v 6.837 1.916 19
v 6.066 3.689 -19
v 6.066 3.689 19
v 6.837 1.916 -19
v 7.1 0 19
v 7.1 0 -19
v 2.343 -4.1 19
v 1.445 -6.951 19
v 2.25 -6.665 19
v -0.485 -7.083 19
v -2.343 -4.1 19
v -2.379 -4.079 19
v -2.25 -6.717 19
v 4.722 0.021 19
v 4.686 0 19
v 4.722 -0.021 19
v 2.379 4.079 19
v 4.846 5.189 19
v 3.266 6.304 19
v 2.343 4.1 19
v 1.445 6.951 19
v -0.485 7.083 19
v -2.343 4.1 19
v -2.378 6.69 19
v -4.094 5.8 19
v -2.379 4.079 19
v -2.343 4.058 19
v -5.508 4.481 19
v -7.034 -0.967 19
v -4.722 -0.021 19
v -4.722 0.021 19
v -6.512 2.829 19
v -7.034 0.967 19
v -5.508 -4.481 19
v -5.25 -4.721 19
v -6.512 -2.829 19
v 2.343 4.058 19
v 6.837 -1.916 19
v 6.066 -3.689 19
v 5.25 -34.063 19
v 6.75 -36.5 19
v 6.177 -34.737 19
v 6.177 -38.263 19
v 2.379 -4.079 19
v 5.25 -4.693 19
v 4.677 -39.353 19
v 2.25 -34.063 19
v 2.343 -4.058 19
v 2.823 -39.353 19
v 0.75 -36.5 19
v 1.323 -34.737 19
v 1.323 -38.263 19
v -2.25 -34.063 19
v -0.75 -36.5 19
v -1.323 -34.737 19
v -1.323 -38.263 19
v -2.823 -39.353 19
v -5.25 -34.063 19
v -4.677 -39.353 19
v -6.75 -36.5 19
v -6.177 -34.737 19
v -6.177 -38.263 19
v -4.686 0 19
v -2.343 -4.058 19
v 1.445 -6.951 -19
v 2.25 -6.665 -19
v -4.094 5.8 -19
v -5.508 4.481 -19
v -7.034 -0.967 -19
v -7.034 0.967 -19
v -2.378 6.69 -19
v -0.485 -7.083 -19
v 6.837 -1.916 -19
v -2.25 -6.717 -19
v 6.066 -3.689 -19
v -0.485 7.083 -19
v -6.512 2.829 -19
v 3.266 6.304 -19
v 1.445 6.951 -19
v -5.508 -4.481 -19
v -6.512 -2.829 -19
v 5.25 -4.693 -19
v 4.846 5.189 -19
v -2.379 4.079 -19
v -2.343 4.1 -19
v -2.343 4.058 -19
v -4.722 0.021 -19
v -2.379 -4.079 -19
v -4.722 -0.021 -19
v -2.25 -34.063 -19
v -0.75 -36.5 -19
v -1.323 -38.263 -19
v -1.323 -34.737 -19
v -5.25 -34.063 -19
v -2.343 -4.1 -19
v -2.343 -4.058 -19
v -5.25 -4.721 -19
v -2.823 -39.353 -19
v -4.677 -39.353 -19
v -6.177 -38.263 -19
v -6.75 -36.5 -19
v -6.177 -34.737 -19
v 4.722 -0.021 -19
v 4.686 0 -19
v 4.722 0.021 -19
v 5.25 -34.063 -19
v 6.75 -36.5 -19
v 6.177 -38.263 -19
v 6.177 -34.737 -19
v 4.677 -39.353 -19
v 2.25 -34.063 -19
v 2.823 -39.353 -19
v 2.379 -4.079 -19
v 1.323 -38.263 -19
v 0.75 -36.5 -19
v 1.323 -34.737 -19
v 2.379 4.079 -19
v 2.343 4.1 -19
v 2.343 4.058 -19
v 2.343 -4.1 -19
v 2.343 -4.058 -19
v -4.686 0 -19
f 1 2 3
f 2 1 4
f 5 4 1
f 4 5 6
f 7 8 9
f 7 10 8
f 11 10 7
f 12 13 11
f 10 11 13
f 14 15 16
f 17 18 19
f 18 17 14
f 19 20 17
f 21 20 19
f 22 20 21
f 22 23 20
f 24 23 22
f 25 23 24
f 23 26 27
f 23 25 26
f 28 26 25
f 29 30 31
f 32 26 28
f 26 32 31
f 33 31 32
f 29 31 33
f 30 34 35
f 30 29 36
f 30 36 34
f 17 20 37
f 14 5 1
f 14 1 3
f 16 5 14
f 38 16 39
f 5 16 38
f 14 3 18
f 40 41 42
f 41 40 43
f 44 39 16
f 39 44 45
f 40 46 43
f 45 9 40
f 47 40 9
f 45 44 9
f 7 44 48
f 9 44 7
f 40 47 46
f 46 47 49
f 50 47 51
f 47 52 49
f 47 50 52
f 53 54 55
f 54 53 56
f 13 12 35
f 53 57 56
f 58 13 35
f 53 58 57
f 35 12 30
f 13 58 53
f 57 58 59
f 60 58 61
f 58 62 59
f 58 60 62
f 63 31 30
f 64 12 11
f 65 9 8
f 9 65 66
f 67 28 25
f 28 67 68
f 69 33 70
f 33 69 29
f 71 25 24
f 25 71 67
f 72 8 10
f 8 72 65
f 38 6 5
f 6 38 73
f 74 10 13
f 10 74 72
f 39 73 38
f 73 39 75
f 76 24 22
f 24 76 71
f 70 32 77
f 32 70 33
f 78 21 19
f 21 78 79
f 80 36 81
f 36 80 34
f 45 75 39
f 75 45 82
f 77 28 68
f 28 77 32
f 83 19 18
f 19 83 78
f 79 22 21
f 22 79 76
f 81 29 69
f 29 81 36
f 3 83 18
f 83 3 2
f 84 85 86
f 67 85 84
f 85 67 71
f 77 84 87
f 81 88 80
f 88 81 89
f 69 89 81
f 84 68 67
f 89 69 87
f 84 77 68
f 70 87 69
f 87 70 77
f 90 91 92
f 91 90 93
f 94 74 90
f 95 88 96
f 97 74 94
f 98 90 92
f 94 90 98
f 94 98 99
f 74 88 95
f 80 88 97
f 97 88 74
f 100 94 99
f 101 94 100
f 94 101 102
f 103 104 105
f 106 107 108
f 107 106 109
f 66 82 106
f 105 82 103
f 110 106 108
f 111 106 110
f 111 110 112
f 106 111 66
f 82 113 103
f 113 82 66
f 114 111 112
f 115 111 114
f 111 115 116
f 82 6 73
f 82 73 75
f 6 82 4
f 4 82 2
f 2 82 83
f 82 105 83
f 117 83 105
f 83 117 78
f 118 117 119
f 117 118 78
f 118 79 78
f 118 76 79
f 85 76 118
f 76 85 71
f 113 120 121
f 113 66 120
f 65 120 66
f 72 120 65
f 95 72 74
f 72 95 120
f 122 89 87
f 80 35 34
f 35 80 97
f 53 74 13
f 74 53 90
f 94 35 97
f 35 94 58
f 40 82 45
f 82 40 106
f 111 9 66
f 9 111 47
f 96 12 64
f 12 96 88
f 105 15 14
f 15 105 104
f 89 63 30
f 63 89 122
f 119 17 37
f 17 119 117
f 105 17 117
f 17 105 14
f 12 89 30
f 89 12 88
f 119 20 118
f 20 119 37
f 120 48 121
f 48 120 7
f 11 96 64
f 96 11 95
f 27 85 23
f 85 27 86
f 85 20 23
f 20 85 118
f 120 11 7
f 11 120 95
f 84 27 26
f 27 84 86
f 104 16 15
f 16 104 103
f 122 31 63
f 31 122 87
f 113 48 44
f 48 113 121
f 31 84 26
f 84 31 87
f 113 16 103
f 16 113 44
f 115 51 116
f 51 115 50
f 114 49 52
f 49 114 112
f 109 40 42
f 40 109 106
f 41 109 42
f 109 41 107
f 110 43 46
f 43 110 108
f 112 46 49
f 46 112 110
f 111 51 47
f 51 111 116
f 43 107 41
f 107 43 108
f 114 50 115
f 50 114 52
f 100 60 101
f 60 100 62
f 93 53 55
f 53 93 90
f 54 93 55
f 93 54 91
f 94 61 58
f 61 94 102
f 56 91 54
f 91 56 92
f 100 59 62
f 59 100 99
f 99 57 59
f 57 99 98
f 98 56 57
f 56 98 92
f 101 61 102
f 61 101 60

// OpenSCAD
include <MCAD/shapes.scad>
pencilRadius = 4.1;
wallThickness = 3;
pencilWall = pencilRadius + wallThickness;
height = 38;
length = 35;

difference() {
union() {
cylinder(height,pencilWall,pencilWall,true);
translate([-3.75,-length/2,0])
cube([wallThickness,length,height],true);
translate([3.75,-length/2,0])
cube([wallThickness,length,height],true);
}

//#cylinder(height+2,pencilRadius,pencilRadius,true);
#hexagon(pencilRadius*2, height+2);



}
translate([3.75,-(length+(wallThickness*0.5)),0])
cylinder(height,wallThickness,wallThickness,true);
translate([-3.75,-(length+(wallThickness*0.5)),0])
cylinder(height,wallThickness,wallThickness,true);
